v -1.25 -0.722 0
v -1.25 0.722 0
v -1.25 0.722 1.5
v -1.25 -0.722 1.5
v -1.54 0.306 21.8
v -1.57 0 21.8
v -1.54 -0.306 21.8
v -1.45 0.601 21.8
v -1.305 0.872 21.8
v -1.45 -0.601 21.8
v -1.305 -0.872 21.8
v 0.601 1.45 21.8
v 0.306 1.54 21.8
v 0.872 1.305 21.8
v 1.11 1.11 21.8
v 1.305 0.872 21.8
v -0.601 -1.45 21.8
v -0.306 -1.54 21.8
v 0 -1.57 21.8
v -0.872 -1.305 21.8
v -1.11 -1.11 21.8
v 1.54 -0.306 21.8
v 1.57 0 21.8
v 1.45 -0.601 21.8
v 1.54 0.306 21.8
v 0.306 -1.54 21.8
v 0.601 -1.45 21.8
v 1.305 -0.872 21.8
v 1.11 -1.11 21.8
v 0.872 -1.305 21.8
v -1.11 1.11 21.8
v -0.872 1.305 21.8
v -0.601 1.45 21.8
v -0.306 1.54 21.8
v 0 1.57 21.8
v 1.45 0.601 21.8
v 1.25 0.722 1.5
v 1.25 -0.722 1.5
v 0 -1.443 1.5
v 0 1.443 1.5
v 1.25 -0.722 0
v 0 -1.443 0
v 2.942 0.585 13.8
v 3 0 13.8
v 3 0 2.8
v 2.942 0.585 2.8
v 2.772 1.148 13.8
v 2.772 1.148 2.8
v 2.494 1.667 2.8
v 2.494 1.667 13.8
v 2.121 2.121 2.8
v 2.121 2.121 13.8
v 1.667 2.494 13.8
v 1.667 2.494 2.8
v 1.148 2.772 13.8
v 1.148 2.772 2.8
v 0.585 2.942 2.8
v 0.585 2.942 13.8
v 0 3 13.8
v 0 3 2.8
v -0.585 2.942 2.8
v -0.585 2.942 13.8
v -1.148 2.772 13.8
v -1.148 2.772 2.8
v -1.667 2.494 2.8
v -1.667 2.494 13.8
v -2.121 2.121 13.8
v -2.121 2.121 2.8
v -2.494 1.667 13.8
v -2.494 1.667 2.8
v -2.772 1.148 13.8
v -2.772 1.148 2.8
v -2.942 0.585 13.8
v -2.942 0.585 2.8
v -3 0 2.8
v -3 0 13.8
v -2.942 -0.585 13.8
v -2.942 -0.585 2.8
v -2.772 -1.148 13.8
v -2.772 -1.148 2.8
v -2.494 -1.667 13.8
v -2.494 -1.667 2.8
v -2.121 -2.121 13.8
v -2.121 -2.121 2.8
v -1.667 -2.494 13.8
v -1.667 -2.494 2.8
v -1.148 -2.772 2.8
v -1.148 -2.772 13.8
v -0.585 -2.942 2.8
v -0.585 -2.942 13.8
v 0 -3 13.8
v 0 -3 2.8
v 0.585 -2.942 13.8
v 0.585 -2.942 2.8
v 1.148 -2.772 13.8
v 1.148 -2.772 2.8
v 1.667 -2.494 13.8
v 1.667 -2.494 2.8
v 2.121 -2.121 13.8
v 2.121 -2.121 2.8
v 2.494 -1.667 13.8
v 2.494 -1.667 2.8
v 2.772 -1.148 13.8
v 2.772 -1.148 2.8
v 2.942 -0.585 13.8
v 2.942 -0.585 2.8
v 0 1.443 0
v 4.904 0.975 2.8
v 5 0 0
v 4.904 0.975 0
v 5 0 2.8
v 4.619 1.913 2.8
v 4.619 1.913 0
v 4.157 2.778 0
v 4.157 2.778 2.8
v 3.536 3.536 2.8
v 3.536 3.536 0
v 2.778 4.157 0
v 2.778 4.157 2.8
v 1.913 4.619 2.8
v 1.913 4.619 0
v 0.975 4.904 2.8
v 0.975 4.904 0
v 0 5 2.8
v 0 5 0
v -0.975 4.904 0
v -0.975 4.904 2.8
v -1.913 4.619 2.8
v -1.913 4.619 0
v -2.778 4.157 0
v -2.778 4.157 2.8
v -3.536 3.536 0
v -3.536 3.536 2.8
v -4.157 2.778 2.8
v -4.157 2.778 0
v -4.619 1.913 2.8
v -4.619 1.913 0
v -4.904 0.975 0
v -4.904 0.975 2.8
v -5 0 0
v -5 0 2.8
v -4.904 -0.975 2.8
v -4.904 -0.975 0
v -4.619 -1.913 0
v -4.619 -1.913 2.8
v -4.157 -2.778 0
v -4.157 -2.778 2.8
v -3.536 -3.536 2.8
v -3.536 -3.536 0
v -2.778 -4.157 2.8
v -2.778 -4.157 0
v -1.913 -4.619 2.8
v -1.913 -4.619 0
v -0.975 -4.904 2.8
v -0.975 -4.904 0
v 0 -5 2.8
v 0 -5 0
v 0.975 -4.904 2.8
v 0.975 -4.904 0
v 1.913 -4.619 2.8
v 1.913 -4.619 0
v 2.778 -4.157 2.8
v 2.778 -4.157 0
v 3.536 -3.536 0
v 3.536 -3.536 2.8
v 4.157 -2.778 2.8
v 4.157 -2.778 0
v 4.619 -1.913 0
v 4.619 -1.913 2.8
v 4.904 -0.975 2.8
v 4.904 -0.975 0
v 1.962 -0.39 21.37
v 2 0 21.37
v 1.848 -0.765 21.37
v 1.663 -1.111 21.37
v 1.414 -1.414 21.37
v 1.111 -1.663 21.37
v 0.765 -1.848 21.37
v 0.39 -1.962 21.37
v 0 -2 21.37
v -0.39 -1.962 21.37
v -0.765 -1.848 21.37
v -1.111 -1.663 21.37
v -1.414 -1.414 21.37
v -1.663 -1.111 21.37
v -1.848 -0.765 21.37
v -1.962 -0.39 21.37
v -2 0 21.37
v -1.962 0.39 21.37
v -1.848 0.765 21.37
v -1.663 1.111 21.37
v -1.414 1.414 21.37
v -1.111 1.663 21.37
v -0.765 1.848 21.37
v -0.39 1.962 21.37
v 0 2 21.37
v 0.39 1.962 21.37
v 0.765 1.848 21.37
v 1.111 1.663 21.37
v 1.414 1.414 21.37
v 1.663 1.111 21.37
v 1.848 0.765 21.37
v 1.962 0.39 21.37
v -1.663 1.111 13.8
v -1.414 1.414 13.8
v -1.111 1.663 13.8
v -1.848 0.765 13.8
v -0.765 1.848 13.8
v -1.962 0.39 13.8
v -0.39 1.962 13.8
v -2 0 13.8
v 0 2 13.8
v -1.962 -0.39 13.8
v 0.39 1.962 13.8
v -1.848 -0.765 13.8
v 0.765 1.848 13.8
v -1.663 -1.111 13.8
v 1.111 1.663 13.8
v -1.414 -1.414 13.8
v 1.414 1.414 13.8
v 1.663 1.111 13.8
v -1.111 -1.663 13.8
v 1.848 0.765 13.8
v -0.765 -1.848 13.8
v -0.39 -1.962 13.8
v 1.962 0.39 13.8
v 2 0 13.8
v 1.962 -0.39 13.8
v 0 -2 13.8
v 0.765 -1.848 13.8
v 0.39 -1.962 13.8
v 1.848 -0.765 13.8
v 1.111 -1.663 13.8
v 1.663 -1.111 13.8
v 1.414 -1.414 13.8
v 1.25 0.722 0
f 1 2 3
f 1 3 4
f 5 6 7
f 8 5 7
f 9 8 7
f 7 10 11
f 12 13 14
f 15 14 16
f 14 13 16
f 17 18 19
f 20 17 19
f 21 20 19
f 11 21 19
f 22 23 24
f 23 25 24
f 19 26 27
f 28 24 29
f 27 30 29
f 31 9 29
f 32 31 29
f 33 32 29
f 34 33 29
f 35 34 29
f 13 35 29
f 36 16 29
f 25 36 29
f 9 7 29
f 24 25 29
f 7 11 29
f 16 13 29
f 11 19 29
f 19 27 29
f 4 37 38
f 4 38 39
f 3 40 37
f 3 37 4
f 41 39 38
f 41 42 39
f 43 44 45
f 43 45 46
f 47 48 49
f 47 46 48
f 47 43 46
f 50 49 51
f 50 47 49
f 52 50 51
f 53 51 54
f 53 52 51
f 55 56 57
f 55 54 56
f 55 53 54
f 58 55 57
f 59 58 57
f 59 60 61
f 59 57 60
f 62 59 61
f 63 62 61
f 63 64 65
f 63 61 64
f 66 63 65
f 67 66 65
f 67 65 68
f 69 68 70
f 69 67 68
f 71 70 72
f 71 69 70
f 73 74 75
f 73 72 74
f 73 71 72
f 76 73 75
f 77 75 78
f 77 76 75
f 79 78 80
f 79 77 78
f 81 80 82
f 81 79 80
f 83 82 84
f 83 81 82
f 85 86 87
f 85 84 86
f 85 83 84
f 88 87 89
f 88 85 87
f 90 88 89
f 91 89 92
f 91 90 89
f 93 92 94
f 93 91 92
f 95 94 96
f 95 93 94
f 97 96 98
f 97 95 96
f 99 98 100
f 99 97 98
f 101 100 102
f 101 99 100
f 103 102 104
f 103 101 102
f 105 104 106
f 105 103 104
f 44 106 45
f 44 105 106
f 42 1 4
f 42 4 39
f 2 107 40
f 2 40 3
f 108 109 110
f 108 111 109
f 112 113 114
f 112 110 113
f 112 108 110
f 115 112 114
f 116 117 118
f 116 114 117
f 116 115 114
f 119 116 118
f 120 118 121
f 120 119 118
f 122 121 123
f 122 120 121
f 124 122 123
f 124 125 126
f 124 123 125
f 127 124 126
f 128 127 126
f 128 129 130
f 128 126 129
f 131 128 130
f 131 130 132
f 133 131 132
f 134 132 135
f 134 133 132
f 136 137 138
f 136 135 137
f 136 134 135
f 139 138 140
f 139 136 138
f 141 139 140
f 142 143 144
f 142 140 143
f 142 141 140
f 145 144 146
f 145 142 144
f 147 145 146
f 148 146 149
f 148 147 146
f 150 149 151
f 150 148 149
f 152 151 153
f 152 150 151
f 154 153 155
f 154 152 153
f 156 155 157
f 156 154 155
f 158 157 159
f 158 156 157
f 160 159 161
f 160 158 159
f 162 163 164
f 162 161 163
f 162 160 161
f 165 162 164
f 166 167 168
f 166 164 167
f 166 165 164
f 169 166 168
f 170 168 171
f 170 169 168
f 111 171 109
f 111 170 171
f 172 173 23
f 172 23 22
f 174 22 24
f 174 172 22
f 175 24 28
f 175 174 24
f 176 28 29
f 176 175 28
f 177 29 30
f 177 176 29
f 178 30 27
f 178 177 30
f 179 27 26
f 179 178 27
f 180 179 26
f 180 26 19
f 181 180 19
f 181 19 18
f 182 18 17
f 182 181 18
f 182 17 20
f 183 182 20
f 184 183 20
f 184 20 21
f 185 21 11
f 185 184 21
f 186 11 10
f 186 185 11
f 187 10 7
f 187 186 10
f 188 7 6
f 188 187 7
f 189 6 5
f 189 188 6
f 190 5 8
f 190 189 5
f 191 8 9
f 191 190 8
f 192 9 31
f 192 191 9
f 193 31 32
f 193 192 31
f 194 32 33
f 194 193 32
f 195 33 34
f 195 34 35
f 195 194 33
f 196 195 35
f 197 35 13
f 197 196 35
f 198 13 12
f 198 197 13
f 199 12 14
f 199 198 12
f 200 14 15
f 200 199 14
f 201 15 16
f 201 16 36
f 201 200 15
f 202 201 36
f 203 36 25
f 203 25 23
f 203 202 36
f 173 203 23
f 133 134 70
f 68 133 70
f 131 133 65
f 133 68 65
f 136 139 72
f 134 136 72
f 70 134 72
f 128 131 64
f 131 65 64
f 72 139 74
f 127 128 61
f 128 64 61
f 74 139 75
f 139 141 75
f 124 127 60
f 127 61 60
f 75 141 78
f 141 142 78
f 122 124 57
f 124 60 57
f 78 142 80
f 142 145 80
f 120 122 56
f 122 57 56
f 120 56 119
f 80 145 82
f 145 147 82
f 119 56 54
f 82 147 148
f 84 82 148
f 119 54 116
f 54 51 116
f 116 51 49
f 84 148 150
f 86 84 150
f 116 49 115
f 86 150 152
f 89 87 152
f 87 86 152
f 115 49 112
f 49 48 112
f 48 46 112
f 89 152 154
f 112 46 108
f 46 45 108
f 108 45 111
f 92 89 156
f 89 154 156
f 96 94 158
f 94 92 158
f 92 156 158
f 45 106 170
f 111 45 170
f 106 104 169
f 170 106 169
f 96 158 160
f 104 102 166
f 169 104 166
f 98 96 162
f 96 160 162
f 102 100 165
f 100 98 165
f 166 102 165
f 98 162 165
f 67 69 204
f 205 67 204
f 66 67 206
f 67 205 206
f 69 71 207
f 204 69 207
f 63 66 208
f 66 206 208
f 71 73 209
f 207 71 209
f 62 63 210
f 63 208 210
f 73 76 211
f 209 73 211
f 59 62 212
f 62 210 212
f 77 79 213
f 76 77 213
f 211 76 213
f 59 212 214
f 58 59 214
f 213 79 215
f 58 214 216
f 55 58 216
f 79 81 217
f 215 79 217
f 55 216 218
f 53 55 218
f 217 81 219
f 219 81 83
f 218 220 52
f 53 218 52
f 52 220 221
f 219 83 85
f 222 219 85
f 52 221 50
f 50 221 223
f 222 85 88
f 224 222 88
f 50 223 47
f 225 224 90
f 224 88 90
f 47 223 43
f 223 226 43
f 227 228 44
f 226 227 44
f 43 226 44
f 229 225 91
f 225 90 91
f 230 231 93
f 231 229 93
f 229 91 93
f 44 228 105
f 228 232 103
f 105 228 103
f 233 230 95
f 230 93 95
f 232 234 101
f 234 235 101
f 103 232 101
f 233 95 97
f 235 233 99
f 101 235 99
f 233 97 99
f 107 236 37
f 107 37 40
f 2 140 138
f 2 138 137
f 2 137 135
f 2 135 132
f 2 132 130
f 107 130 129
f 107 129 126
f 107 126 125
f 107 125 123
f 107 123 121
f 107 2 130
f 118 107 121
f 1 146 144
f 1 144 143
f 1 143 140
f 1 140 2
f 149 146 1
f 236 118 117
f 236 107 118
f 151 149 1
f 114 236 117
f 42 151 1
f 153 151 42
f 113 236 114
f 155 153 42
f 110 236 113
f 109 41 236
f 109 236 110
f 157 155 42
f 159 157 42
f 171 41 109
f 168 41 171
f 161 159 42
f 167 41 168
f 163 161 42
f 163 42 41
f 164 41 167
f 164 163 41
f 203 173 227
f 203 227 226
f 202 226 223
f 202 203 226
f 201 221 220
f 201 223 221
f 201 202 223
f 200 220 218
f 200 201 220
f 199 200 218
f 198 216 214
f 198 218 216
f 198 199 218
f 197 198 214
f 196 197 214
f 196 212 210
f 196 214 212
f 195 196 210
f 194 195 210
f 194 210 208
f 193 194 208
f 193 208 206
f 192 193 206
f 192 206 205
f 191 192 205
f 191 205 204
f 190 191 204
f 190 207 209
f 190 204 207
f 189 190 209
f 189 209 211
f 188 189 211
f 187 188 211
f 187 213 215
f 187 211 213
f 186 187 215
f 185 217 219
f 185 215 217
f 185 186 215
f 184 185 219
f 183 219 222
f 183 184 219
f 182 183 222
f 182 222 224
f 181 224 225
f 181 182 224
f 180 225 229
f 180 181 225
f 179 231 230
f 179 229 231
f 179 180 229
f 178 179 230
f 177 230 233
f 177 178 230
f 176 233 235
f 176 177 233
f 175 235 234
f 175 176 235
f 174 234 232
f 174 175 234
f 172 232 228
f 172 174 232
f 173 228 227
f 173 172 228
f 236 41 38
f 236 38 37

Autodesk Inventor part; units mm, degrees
ref_plane "YZ Plane" through (0, 0, 0) normal (1, 0, 0) x (0, 1, 0)
ref_plane "XZ Plane" through (0, 0, 0) normal (0, 1, 0) x (-1, 0, 0)
ref_plane "XY Plane" through (0, 0, 0) normal (0, 0, 1) x (1, 0, 0)
sketch "スケッチ1" plane through (0, 0, 0) normal (0, 1, 0) x (-1, 0, 0)
  line L0 (0, 0) -> (-5, 0)
  line L1 (-5, 0) -> (-5, 2.8)
  line L2 (-5, 2.8) -> (-3, 2.8)
  line L3 (-3, 2.8) -> (-3, 13.8)
  line L4 (-3, 13.8) -> (-2, 13.8)
  line L5 (-2, 13.8) -> (-2, 21.37)
  line L6 (-1.57, 21.8) -> (0, 21.8)
  line L7 (0, 21.8) -> (0, 0)
  line L8 (-1.57, 21.8) -> (-2, 21.37)
  point P0 (-2, 21.8)
  dimension "d0" = 8
  dimension "d1" = 11
  dimension "d2" = 2.8
  dimension "d3" = 0.43
  dimension "d4" = 0.43
  dimension "d5" = 4
  dimension "d6" = 10
  dimension "d7" = 6
revolve "回転1" add sketch "スケッチ1" angle 360 about axis through (0, 0, 21.8) along (0, 0, -1)
thread "ねじ1" size "M4x0.7" class "6g" standard "ANSI Metric M Profile" length 7.57 offset 1.2
sketch "スケッチ2" plane through (0, 0, 0) normal (0, 0, -1) x (-1, 0, 0)
  line L0 (0, -1.4434) -> (-1.25, -0.7217)
  line L1 (-1.25, -0.7217) -> (-1.25, 0.7217)
  line L2 (-1.25, 0.7217) -> (0, 1.4434)
  line L3 (0, 1.4434) -> (1.25, 0.7217)
  line L4 (1.25, 0.7217) -> (1.25, -0.7217)
  line L5 (1.25, -0.7217) -> (0, -1.4434)
  point P0 (0, 0)
  point P1 (0, 0)
  dimension "d11" = 2.5
extrude "押し出し1" cut sketch "スケッチ2" against normal blind 1.5
equation "\"d4\" = d3"
properties part number "DBTS4-11-8-DHC" material "ステンレス鋼 AISI 304"
